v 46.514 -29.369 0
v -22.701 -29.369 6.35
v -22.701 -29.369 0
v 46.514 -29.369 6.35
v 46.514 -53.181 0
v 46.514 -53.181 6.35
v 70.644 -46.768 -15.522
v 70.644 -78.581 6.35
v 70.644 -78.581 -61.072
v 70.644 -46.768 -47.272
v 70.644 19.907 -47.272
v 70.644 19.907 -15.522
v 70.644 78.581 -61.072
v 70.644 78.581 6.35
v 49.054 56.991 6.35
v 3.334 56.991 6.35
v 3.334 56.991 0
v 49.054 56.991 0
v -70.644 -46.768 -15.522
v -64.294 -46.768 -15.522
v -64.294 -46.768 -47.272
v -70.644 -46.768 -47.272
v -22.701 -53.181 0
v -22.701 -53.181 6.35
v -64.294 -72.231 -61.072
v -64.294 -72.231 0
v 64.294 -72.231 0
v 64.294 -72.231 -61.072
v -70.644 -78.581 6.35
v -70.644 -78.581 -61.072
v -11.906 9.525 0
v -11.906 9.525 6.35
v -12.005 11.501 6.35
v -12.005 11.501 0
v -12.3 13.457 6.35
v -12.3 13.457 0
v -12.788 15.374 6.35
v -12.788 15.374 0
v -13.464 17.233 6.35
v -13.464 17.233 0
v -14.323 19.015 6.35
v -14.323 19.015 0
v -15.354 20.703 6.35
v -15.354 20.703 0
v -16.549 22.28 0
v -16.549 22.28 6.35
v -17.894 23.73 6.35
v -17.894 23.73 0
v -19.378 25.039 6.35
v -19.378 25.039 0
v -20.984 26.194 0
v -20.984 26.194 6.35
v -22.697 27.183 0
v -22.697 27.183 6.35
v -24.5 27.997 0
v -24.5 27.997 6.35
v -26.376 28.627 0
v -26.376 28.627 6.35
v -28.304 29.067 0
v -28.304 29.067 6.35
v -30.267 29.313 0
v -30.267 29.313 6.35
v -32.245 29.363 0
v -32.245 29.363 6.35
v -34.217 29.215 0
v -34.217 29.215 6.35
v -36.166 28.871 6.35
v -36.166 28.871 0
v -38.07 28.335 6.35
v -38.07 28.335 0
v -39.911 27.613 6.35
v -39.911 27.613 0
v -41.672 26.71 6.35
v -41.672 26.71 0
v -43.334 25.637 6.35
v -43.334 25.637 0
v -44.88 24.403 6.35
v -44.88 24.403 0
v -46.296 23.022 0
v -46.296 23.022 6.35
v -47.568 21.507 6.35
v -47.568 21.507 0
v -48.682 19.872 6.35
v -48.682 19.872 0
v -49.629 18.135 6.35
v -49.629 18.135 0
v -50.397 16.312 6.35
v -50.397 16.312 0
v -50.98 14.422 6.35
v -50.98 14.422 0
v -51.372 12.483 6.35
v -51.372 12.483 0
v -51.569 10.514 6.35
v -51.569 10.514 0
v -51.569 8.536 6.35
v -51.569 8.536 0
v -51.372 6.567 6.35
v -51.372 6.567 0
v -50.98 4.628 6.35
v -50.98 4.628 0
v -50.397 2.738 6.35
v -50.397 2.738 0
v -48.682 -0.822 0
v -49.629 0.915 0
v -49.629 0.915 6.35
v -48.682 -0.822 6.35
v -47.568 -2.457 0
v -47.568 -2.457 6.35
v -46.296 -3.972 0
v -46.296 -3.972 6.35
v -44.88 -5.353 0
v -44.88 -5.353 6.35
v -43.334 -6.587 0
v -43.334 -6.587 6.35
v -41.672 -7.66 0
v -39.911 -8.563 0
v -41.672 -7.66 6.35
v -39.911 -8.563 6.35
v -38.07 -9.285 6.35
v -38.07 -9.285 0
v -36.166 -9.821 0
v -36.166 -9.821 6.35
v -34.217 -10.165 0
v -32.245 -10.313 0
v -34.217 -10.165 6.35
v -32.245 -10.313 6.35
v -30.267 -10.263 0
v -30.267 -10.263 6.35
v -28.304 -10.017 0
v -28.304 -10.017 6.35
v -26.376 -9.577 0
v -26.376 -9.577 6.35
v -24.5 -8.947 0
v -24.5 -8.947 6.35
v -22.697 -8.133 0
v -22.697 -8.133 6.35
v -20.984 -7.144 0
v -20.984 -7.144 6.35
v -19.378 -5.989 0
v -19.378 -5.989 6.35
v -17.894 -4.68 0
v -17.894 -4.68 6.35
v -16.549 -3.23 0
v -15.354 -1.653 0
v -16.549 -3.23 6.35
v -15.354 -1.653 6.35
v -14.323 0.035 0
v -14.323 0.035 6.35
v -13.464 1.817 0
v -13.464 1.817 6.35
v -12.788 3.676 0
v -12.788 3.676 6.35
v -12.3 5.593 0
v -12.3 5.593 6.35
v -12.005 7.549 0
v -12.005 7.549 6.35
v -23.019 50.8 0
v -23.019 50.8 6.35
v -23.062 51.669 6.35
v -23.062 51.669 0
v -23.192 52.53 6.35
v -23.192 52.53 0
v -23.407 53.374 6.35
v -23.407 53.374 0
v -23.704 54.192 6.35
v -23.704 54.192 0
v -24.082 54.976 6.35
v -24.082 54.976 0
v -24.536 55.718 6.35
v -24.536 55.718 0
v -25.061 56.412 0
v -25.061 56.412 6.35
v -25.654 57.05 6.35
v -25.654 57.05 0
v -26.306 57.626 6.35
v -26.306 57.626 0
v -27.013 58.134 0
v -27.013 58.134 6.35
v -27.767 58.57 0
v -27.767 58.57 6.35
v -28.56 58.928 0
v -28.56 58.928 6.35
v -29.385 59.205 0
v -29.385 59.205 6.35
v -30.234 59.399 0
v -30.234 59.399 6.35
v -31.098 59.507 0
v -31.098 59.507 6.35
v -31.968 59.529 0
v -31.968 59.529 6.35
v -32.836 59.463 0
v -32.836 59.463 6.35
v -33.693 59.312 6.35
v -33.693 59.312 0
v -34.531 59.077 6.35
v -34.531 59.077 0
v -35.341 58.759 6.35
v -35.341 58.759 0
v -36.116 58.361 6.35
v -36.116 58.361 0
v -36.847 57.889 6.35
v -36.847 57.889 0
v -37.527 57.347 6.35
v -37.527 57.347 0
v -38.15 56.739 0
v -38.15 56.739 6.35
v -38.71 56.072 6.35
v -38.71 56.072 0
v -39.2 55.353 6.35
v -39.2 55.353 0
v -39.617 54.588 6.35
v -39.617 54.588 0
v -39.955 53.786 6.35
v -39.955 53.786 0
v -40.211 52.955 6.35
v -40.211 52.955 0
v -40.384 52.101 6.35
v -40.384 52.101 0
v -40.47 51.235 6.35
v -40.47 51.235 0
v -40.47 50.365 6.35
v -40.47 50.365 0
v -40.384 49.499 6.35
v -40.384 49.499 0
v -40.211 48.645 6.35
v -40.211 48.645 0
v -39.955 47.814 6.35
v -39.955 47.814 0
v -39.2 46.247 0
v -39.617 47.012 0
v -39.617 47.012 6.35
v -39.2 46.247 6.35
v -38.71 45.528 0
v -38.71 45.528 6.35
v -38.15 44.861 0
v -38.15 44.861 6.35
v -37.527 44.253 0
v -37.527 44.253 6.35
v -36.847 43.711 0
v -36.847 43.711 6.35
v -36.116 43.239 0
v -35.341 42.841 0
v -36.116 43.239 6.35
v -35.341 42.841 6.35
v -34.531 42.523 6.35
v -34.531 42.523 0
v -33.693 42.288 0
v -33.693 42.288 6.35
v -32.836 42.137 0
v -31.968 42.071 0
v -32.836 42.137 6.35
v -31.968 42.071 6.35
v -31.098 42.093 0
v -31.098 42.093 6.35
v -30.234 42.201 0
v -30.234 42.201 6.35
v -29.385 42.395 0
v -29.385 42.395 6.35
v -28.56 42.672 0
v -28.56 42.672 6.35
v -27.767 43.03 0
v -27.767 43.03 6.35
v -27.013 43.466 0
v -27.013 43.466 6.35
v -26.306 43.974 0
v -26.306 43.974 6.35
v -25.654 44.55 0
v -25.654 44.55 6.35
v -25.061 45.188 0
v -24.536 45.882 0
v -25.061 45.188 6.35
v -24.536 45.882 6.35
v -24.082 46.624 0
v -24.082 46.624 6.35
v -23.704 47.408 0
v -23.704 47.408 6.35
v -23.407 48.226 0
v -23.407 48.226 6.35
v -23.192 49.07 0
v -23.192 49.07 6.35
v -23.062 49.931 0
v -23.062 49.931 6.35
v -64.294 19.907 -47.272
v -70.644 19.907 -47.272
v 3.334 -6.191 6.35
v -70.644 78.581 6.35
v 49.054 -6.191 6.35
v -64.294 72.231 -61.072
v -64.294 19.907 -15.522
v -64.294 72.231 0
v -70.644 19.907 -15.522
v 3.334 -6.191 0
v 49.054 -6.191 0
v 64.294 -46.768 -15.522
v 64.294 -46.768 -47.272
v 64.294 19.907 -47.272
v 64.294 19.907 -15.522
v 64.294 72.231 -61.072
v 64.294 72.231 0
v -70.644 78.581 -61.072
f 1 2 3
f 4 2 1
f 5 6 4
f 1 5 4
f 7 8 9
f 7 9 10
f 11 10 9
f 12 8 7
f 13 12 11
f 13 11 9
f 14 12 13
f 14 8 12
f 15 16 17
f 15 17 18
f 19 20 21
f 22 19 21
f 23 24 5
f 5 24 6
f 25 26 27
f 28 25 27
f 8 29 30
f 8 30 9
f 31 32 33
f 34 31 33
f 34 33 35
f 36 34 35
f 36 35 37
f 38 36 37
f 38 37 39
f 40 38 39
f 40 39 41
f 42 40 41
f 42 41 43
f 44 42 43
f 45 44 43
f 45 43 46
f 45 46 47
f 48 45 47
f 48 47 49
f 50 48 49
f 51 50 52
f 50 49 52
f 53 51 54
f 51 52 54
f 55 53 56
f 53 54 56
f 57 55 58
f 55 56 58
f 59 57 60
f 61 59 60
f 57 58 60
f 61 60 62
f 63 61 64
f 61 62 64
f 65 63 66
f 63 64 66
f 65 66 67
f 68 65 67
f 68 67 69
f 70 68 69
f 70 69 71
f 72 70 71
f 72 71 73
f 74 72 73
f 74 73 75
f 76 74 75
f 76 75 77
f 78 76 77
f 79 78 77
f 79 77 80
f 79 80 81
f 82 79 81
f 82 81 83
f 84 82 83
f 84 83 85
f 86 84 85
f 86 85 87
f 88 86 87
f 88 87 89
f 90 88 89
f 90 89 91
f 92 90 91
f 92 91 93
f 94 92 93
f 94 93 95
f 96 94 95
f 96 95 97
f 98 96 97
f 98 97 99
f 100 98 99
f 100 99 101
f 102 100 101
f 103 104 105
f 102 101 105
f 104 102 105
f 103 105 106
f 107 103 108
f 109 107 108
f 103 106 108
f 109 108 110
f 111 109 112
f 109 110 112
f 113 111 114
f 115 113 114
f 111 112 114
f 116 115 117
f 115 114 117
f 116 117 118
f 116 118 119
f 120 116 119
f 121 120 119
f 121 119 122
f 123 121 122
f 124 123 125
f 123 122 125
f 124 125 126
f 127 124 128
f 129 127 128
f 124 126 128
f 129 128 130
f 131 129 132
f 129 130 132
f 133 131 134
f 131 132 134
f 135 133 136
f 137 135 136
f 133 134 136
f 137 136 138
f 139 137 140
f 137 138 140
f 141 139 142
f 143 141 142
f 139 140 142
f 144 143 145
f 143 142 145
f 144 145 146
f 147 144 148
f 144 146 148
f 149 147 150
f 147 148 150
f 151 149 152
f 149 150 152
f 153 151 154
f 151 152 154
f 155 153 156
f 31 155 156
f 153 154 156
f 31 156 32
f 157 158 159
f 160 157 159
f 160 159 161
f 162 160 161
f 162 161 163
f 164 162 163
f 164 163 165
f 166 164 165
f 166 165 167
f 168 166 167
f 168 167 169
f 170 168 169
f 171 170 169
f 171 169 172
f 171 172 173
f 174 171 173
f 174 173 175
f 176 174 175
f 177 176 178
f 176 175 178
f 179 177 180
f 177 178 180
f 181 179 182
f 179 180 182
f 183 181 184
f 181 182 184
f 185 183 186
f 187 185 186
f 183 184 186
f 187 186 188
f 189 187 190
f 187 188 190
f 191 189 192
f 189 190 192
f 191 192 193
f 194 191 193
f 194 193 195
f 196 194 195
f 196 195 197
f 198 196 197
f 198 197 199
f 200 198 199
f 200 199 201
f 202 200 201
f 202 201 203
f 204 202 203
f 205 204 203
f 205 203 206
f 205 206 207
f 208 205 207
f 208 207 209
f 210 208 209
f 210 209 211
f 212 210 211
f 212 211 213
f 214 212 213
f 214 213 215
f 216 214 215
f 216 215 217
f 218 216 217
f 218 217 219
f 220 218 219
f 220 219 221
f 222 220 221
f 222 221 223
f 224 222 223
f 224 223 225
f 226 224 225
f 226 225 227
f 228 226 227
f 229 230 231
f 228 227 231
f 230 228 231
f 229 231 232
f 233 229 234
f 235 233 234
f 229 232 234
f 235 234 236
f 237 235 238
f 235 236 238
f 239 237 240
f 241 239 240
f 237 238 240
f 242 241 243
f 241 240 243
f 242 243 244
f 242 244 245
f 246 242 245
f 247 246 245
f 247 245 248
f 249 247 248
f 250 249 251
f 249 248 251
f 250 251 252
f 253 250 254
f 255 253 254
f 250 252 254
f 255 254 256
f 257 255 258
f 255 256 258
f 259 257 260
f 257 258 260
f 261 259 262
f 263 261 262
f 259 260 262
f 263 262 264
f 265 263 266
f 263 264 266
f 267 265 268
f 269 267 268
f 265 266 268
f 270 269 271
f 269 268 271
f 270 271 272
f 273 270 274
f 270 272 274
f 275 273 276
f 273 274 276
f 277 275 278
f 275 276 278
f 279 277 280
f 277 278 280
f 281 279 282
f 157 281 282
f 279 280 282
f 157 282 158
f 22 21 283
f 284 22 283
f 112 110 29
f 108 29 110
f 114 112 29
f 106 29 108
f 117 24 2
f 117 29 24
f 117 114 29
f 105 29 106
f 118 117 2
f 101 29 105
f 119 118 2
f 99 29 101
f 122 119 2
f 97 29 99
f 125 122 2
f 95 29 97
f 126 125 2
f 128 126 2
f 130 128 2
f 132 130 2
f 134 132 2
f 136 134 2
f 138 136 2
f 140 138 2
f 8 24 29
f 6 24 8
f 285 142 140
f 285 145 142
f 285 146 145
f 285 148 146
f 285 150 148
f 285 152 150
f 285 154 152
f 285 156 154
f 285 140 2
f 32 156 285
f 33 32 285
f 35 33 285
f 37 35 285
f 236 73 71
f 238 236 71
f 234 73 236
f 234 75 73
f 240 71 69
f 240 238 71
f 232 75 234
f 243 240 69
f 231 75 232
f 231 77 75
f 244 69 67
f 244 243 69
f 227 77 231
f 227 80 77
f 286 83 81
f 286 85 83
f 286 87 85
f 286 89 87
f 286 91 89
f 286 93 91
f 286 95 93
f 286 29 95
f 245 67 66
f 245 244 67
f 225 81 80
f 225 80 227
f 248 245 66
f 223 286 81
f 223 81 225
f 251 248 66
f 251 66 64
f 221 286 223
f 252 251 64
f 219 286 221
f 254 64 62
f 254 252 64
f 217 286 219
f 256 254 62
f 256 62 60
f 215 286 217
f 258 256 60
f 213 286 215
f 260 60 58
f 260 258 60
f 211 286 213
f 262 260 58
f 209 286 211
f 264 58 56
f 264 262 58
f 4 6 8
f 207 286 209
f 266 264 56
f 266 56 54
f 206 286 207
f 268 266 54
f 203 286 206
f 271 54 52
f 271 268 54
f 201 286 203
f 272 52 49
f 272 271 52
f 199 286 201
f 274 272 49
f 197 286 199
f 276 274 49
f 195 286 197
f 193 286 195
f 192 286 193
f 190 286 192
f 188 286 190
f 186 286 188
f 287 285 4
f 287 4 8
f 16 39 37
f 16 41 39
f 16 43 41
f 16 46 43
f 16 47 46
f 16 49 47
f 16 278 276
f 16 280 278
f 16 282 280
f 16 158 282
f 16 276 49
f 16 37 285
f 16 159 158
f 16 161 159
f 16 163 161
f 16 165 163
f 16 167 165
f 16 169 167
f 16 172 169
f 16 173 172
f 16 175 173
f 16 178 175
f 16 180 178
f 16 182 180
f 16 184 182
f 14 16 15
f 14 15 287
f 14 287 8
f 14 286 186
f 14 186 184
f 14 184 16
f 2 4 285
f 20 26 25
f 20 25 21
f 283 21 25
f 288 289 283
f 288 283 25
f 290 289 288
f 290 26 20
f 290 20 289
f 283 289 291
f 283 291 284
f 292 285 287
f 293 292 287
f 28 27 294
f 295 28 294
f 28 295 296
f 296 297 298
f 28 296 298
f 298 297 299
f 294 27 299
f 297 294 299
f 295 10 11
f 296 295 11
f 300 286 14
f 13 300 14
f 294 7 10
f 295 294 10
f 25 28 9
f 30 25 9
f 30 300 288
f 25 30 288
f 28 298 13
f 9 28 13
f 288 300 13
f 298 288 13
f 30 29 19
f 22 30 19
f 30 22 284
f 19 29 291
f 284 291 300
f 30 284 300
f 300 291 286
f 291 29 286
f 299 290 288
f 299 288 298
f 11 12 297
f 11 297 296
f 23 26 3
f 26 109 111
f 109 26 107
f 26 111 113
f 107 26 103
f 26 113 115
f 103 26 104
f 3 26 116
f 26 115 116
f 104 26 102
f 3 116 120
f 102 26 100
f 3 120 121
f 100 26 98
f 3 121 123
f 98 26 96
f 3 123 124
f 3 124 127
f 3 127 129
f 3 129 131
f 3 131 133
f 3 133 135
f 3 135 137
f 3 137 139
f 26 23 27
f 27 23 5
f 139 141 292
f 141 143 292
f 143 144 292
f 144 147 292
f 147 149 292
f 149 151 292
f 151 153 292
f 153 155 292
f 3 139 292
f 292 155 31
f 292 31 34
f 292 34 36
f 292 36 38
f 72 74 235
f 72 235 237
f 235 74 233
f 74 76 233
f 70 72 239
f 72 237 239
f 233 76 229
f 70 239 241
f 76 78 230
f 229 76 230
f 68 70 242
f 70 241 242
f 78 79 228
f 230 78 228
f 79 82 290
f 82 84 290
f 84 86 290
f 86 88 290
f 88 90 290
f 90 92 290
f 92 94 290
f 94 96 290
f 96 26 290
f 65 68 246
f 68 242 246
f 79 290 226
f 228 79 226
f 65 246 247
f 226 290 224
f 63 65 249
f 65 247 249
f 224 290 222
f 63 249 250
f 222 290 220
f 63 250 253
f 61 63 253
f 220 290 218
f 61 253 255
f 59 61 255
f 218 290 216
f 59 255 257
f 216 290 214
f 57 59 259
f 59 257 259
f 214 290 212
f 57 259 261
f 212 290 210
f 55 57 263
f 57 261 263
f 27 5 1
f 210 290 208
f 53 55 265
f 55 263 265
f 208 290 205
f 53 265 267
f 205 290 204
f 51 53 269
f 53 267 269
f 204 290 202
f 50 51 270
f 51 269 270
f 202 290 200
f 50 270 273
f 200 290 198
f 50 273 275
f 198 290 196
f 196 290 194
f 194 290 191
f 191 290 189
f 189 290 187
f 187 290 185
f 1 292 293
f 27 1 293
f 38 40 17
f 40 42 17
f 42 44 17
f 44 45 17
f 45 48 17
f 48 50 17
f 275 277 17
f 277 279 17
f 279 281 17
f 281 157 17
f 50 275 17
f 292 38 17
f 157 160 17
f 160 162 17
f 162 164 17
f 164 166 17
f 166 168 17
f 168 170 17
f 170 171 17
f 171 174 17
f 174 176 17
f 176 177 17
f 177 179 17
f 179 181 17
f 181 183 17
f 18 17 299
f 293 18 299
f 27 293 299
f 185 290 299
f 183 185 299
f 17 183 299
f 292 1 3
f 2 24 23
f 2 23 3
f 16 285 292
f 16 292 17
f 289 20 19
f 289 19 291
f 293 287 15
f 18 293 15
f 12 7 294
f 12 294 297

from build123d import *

# Parameters (mm, degrees)
SKETCH1_W           = 128.5875
SKETCH1_H           = 144.4625
BOSS_EXTRUDE1_DEPTH = 61.07176
SHELL1_T            = 6.35
SKETCH2_R           = 8.73125
SKETCH2_R_2         = 19.84375
SKETCH2_W           = 45.72
SKETCH2_H           = 63.1825
SKETCH2_W_2         = 69.215
SKETCH2_H_2         = 23.8125
CUT_EXTRUDE1_DEPTH  = 126.344509202
SKETCH3_W           = 31.75
SKETCH3_H           = 66.675
CUT_EXTRUDE2_DEPTH  = 173.82051492


with BuildPart() as part:
    # Sketch1 → Boss-Extrude1 (new body)
    with BuildSketch(Plane.XY):
        Rectangle(SKETCH1_W, SKETCH1_H)
    extrude(amount=-BOSS_EXTRUDE1_DEPTH)

    # Shell1
    shell1_openings = [part.faces().sort_by_distance(p)[0] for p in [
        (0, 0, -61.07176),
    ]]
    offset(amount=SHELL1_T, openings=shell1_openings, kind=Kind.INTERSECTION)

    # Sketch2 → Cut-Extrude1 (cut, through all)
    with BuildSketch(Plane.XY.offset(6.35)):
        with Locations((-31.75, 50.8)):
            Circle(SKETCH2_R)
        with Locations((-31.75, 9.525)):
            Circle(SKETCH2_R_2)
        with Locations((26.19375, 25.4)):
            Rectangle(SKETCH2_W, SKETCH2_H)
        with Locations((11.90625, -41.275)):
            Rectangle(SKETCH2_W_2, SKETCH2_H_2)
    extrude(amount=-CUT_EXTRUDE1_DEPTH, mode=Mode.SUBTRACT)

    # Sketch3 → Cut-Extrude2 (cut, through all)
    with BuildSketch(Plane(origin=(70.64375, 0, 0), x_dir=(0, 0, -1), z_dir=(1, 0, 0))):
        with Locations((31.39694, -13.43025)):
            Rectangle(SKETCH3_W, SKETCH3_H)
    extrude(amount=-CUT_EXTRUDE2_DEPTH, mode=Mode.SUBTRACT)


solid = part.part
